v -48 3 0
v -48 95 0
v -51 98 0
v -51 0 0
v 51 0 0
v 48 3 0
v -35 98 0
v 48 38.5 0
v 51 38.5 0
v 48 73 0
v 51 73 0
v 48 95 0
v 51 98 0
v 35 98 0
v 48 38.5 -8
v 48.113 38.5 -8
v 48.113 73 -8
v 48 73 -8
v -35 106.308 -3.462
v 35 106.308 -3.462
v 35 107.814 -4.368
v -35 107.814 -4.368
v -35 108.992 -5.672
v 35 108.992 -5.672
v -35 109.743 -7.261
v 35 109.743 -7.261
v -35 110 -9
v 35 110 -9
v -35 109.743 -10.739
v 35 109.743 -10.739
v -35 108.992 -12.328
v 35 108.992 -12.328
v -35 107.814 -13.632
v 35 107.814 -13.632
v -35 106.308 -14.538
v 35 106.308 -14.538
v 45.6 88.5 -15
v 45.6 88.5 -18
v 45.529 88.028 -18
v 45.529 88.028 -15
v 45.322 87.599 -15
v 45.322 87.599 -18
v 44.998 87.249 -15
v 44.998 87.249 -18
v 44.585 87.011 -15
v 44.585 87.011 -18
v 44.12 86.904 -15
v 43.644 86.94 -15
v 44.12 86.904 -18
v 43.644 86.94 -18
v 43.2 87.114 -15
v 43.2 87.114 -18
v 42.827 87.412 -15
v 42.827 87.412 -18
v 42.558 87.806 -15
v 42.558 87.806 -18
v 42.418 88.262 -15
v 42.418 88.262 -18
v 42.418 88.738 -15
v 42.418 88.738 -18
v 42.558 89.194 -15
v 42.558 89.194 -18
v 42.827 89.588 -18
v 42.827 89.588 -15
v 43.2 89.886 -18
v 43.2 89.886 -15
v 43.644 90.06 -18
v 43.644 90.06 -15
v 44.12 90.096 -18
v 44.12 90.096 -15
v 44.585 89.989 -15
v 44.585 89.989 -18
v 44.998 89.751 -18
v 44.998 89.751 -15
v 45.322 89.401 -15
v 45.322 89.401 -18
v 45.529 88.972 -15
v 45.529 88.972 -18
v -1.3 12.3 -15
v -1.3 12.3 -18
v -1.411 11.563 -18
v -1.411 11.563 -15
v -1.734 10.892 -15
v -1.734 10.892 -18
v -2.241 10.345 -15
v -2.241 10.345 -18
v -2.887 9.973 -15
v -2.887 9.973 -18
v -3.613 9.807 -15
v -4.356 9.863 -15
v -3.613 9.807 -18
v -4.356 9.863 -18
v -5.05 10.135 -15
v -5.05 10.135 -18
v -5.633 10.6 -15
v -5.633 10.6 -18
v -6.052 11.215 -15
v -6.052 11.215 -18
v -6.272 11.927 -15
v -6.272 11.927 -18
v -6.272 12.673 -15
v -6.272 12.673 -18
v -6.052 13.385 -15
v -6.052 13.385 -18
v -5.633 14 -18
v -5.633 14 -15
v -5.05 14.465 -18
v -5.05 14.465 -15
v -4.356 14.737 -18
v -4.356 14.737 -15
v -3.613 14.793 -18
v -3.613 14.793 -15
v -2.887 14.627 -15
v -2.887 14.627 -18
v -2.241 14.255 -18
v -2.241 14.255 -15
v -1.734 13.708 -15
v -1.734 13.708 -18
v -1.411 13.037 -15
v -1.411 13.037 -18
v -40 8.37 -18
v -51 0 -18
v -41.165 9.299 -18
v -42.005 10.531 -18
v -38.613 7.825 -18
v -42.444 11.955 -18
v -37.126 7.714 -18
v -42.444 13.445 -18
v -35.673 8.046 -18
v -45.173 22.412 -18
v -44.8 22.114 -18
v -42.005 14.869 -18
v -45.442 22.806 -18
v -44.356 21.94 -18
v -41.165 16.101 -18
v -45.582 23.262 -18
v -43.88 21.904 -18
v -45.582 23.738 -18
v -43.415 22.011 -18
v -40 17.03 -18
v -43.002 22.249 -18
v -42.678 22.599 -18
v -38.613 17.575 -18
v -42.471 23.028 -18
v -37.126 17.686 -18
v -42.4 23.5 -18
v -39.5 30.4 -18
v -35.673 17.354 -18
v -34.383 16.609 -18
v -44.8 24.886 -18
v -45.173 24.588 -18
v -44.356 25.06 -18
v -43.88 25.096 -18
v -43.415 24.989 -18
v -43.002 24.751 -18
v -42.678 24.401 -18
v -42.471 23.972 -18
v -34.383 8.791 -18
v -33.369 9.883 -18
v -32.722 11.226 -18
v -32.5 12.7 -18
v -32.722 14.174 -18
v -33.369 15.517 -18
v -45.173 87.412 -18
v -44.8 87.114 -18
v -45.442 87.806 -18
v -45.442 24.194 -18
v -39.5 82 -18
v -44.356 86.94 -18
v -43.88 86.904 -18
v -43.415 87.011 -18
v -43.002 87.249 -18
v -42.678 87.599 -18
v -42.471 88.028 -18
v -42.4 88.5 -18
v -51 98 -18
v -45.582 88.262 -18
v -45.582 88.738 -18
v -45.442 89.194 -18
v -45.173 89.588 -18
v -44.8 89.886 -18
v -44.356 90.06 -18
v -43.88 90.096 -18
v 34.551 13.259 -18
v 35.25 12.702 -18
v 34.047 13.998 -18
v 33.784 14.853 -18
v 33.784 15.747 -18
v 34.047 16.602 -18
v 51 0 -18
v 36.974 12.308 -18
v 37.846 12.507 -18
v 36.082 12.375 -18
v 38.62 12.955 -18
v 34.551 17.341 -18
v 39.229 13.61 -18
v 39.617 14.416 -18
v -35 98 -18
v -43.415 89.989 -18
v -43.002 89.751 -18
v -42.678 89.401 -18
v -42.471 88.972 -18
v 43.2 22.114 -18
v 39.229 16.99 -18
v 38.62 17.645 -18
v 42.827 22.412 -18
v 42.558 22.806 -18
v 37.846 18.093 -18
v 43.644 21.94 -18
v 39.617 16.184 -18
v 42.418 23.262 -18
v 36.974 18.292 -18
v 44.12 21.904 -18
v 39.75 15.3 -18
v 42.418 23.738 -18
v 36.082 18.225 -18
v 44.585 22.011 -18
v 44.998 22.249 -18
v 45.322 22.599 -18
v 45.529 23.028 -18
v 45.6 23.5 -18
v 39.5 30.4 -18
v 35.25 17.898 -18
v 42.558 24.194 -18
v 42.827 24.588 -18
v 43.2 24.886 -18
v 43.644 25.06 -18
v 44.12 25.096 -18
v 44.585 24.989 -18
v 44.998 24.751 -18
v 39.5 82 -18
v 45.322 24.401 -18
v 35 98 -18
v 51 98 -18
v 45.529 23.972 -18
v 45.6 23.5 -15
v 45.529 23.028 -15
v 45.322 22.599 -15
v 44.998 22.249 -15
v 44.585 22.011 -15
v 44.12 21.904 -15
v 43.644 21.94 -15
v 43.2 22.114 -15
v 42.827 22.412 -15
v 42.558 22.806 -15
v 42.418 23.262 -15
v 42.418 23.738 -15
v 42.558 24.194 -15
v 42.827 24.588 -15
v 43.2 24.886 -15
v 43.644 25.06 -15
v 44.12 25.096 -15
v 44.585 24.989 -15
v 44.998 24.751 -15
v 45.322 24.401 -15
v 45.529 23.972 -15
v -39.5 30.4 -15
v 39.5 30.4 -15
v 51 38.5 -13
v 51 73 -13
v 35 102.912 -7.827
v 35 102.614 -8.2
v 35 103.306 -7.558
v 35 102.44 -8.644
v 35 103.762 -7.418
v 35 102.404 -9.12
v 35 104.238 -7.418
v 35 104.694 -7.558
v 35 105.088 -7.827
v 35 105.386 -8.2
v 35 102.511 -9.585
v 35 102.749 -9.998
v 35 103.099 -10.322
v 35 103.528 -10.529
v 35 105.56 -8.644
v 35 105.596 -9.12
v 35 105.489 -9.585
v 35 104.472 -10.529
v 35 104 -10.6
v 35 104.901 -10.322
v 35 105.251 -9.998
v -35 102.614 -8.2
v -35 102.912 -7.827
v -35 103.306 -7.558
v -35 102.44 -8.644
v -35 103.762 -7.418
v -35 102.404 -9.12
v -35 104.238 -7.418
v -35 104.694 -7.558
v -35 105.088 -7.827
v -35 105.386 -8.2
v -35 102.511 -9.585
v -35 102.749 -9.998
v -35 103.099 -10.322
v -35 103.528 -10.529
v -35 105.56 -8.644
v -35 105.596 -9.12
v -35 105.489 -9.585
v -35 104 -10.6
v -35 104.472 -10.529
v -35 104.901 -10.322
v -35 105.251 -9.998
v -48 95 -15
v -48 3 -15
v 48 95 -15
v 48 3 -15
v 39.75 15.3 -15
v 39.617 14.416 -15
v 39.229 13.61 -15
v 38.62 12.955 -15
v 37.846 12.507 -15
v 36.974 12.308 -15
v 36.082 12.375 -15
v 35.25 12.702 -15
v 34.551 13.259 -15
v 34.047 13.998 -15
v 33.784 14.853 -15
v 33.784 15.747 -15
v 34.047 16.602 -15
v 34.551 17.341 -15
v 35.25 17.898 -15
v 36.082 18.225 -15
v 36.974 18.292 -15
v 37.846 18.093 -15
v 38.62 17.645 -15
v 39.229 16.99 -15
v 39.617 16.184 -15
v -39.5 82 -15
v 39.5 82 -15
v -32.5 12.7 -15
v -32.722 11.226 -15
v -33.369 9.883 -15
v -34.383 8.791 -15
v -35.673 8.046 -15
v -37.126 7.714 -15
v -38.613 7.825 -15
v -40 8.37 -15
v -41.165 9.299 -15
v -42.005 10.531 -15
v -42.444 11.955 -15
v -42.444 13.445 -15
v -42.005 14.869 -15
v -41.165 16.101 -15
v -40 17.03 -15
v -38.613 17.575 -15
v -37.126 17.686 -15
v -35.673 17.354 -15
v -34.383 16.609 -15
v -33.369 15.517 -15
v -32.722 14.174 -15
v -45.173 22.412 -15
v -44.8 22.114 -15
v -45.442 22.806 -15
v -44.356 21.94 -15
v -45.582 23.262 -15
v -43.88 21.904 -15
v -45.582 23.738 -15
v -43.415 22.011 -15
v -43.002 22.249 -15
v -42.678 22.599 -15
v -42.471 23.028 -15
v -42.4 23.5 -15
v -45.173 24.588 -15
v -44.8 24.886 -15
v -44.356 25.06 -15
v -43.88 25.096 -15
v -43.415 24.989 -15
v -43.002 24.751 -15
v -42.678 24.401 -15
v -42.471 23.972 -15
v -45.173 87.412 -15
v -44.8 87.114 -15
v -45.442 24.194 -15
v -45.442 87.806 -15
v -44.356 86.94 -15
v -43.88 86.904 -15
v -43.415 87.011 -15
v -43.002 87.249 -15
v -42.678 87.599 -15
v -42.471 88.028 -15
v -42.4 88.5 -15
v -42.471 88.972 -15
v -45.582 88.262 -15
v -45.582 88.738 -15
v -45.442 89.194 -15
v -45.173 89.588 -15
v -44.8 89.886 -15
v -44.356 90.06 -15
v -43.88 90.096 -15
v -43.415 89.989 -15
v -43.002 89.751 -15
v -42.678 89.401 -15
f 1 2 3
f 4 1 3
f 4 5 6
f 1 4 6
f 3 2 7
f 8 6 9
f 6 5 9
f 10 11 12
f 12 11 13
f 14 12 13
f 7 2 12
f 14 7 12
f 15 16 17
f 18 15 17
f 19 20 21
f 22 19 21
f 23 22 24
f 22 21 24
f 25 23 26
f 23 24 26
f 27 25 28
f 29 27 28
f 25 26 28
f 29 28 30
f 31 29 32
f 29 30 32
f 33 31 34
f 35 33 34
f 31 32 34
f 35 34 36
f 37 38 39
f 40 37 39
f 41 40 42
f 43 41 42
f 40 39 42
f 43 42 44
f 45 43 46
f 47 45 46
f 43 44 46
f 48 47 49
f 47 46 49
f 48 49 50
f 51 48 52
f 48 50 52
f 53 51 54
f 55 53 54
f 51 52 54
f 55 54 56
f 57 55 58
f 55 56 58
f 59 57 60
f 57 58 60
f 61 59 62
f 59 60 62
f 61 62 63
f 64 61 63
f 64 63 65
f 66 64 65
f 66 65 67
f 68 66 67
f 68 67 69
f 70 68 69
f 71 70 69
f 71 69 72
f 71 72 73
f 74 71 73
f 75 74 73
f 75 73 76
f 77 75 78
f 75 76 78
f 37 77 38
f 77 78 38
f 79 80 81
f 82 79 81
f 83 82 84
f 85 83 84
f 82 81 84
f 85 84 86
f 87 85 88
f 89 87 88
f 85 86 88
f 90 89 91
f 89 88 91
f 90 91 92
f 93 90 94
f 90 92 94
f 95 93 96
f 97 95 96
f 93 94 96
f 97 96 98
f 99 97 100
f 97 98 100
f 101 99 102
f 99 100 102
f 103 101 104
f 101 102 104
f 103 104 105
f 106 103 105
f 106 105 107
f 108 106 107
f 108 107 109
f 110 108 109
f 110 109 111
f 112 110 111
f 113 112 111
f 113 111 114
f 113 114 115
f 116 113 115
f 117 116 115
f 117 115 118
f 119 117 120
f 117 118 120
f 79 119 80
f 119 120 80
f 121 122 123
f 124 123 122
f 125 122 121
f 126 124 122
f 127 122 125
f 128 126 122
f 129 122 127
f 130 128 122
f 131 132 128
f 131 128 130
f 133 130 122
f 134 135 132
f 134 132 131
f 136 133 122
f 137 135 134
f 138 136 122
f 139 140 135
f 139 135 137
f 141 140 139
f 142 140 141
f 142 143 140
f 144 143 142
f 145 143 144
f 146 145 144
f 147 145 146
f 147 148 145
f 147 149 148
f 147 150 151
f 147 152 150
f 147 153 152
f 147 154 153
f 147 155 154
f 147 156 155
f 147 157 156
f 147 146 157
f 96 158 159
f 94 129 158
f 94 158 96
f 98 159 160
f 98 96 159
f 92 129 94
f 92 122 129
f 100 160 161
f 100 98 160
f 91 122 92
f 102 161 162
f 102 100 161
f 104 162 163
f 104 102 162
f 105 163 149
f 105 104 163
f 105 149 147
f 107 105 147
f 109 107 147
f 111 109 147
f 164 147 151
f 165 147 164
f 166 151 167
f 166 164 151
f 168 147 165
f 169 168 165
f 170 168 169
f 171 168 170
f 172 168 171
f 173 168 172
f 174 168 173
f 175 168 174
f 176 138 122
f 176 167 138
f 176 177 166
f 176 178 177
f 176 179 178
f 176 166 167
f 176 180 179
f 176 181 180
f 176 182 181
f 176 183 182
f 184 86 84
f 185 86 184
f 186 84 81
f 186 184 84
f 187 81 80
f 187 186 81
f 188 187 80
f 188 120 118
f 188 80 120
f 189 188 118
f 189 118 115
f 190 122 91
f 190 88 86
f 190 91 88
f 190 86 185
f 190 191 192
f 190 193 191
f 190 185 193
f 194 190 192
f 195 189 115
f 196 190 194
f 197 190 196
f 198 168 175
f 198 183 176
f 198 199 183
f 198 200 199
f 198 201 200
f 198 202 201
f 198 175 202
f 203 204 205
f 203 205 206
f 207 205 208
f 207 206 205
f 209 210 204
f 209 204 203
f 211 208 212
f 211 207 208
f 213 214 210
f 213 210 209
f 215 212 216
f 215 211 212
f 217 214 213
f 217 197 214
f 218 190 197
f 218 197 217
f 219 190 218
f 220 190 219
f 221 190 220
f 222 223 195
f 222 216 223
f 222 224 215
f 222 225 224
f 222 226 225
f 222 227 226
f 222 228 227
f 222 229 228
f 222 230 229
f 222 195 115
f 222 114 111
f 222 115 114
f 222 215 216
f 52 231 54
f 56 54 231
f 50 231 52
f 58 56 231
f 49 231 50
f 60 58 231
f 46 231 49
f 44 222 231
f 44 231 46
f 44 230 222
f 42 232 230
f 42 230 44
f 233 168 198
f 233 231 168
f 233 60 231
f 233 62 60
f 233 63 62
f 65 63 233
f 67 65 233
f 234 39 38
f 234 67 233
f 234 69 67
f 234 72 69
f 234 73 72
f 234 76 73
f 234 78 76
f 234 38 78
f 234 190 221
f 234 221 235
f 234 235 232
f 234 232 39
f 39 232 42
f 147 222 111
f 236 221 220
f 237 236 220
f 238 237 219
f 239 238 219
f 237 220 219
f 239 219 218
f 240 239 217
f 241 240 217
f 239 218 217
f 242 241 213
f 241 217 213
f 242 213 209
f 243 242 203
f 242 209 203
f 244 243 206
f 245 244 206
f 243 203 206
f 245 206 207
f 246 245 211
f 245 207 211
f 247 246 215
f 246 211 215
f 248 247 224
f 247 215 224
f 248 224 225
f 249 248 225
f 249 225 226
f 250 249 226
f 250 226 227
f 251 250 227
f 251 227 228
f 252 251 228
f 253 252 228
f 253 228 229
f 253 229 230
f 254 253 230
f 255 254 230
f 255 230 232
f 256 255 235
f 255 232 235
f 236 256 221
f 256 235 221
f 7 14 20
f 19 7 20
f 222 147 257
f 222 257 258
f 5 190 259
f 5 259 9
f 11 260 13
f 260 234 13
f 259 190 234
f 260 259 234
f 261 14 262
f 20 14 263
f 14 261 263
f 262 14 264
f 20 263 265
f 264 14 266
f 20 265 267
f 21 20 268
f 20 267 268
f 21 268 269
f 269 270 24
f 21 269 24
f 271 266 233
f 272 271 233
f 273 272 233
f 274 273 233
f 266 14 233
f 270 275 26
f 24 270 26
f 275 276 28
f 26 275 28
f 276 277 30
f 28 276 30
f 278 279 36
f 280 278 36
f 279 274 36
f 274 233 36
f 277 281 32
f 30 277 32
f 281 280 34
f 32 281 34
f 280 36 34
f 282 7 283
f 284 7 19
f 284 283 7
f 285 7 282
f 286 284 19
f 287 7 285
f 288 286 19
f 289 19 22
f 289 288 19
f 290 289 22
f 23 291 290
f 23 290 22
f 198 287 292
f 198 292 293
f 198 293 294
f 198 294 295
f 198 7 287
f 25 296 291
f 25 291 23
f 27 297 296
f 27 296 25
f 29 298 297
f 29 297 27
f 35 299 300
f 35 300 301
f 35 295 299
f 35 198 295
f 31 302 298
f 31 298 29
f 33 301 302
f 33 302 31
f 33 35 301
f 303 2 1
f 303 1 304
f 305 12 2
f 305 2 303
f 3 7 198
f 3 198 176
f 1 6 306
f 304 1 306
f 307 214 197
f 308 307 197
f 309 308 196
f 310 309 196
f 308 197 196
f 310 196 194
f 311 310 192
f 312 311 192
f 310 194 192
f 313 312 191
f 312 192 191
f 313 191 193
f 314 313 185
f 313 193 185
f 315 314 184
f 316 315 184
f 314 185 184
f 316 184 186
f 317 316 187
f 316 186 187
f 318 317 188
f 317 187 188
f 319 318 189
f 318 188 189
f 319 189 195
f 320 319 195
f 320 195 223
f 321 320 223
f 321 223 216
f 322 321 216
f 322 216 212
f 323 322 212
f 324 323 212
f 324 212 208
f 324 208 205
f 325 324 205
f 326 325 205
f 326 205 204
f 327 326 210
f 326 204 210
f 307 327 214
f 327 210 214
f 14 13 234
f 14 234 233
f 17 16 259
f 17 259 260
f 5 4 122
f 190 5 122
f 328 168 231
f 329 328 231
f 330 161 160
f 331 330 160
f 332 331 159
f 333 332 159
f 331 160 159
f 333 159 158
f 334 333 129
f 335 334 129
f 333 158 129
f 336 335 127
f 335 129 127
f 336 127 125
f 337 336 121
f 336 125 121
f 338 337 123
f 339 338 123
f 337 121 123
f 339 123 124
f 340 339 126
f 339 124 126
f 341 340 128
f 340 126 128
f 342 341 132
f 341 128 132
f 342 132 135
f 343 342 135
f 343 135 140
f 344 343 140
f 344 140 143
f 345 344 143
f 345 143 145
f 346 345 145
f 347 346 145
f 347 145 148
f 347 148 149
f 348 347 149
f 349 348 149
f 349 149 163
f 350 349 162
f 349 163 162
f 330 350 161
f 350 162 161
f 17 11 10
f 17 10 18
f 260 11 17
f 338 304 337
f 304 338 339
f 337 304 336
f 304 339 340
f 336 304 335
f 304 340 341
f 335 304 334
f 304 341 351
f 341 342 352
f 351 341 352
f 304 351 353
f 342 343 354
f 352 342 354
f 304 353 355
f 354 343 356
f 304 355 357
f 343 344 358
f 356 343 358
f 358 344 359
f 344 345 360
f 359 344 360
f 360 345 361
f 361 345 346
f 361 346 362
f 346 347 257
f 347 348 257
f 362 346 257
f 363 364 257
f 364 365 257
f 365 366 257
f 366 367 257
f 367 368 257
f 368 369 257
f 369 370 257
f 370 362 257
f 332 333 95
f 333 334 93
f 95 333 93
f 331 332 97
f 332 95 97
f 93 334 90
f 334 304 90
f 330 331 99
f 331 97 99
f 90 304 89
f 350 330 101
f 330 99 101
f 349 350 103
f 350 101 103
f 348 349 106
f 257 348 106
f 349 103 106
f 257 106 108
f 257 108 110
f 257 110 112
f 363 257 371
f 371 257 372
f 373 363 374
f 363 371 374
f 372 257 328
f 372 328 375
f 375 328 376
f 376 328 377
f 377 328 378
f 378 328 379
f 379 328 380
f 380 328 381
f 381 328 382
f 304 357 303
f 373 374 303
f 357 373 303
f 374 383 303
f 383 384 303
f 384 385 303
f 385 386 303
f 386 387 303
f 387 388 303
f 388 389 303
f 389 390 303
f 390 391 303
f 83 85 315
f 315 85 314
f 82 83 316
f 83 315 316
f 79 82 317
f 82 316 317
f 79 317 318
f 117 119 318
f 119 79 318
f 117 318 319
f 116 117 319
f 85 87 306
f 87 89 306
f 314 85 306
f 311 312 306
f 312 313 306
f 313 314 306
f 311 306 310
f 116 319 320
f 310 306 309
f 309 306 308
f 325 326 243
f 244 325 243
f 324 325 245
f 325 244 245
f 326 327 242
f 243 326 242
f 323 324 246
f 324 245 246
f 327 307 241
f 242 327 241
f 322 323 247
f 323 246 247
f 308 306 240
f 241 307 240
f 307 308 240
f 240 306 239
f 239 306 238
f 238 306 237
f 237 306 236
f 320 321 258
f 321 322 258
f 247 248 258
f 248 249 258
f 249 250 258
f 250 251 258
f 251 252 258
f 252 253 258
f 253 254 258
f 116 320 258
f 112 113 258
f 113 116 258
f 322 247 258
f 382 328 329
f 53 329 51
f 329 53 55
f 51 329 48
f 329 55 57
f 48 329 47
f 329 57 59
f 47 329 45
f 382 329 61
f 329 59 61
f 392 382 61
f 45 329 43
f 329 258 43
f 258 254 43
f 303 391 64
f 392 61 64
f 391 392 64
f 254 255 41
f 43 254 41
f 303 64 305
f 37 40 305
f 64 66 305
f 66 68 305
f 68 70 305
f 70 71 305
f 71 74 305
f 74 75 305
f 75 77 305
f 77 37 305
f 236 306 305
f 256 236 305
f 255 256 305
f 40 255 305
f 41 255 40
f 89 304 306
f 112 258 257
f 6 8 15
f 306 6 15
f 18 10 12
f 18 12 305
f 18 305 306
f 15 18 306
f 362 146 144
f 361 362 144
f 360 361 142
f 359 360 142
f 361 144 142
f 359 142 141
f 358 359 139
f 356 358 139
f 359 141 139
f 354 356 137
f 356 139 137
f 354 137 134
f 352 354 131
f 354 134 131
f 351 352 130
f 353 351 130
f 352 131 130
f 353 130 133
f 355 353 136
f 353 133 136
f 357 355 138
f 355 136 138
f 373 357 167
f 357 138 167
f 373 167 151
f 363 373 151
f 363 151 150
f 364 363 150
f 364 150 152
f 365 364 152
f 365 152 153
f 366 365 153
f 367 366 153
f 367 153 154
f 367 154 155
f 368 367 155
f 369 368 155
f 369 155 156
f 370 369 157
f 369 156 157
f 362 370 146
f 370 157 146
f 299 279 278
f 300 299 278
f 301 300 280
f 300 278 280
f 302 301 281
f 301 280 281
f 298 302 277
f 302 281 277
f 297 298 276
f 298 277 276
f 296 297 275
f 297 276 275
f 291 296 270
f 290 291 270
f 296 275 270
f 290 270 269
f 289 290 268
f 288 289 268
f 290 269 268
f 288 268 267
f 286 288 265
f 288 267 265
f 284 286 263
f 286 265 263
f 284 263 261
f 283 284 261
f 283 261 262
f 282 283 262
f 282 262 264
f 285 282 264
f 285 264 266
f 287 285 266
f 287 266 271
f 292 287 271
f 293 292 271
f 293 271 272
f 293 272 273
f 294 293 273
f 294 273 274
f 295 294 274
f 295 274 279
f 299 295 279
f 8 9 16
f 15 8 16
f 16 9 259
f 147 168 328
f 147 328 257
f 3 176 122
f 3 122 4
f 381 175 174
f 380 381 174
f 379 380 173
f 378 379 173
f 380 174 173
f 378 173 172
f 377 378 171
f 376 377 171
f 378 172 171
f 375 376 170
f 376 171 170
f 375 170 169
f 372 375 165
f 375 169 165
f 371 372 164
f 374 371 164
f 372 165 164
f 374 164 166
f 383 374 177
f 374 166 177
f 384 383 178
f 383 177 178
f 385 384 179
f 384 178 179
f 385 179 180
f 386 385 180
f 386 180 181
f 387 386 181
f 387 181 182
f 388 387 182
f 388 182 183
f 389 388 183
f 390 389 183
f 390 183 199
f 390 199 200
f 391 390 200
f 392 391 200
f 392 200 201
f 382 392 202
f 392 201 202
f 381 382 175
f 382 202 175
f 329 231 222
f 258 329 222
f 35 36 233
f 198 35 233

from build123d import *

# Parameters (mm, degrees)
ESBO_O2_W                = 18
ESBO_O2_H                = 98
RESSALTO_EXTRUS_O1_DEPTH = 51
CASCA1_T                 = -3
ESBO_O4_R                = 1.6
ESBO_O4_R_2              = 5
ESBO_O4_R_3              = 3
ESBO_O4_R_4              = 2.5
ESBO_O4_W                = 79
ESBO_O4_H                = 51.6
CORTE_EXTRUS_O1_DEPTH    = 3
ESBO_O5_R                = 1.6
RESSALTO_EXTRUS_O2_DEPTH = 102
ESBO_O6_W                = 16
ESBO_O6_H                = 12
CORTE_EXTRUS_O2_DEPTH    = 19
ESBO_O7_W                = 8
ESBO_O7_H                = 34.5
CORTE_EXTRUS_O3_DEPTH    = 10
CHANFRO1_SIZE            = 5
CHANFRO1_SIZE2           = 2.886751346


with BuildPart() as part:
    # Esboço2 → Ressalto-extrusão1 (new body, symmetric)
    with BuildSketch(Plane(origin=(0, 0, 0), x_dir=(0, 0, -1), z_dir=(1, 0, 0))):
        with Locations((9, 49)):
            Rectangle(ESBO_O2_W, ESBO_O2_H)
    extrude(amount=RESSALTO_EXTRUS_O1_DEPTH, both=True)

    # Casca1
    casca1_openings = [part.faces().sort_by_distance(p)[0] for p in [
        (0, 49, 0),
    ]]
    offset(amount=CASCA1_T, openings=casca1_openings, kind=Kind.INTERSECTION)

    # Esboço4 → Corte-extrusão1 (cut)
    with BuildSketch(Plane(origin=(0, 0, -18), x_dir=(1, 0, 0), z_dir=(0, 0, -1))):
        with Locations((-44, -23.5)):
            Circle(ESBO_O4_R)
        with Locations((-44, -88.5)):
            Circle(ESBO_O4_R)
        with Locations((44, -88.5)):
            Circle(ESBO_O4_R)
        with Locations((44, -23.5)):
            Circle(ESBO_O4_R)
        with Locations((-37.5, -12.7)):
            Circle(ESBO_O4_R_2)
        with Locations((36.75, -15.3)):
            Circle(ESBO_O4_R_3)
        with Locations((-3.8, -12.3)):
            Circle(ESBO_O4_R_4)
        with Locations((0, -56.2)):
            Rectangle(ESBO_O4_W, ESBO_O4_H)
    extrude(amount=-CORTE_EXTRUS_O1_DEPTH, mode=Mode.SUBTRACT)

    # Esboço5 → Ressalto-extrusão2 (add, through all)
    with BuildSketch(Plane(origin=(51, 0, 0), x_dir=(0, 0, -1), z_dir=(1, 0, 0))):
        with BuildLine():
            Line((14.538461538, 106.307692308), (18, 98))
            Line((18, 98), (0, 98))
            Line((0, 98), (3.461538462, 106.307692308))
            ThreePointArc((3.461538462, 106.307692308), (9, 110), (14.538461538, 106.307692308))
        make_face()
        with Locations((9, 104)):
            Circle(ESBO_O5_R, mode=Mode.SUBTRACT)
    extrude(amount=-RESSALTO_EXTRUS_O2_DEPTH)

    # Esboço6 → Corte-extrusão2 (cut, through all)
    with BuildSketch(Plane(origin=(0, 0, -18), x_dir=(-1, 0, 0), z_dir=(0, 0, -1))):
        with Locations((-43, 104)):
            Rectangle(ESBO_O6_W, ESBO_O6_H)
        with Locations((43, 104)):
            Rectangle(ESBO_O6_W, ESBO_O6_H)
    extrude(amount=-CORTE_EXTRUS_O2_DEPTH, mode=Mode.SUBTRACT)

    # Esboço7 → Corte-extrusão3 (cut)
    with BuildSketch(Plane(origin=(51, 0, 0), x_dir=(0, 0, -1), z_dir=(1, 0, 0))):
        with Locations((4, 55.75)):
            Rectangle(ESBO_O7_W, ESBO_O7_H)
    extrude(amount=-CORTE_EXTRUS_O3_DEPTH, mode=Mode.SUBTRACT)

    # Chanfro1
    chanfro1_edges = [part.edges().sort_by_distance(p)[0] for p in [
        (51, 55.75, -8),
    ]]
    chanfro1_side = [part.faces().sort_by_distance(p)[0] for p in [
        (51, 47.747983871, -9.927419355),
    ]]
    chamfer(chanfro1_edges, length=CHANFRO1_SIZE, length2=CHANFRO1_SIZE2, reference=chanfro1_side[0])


solid = part.part
